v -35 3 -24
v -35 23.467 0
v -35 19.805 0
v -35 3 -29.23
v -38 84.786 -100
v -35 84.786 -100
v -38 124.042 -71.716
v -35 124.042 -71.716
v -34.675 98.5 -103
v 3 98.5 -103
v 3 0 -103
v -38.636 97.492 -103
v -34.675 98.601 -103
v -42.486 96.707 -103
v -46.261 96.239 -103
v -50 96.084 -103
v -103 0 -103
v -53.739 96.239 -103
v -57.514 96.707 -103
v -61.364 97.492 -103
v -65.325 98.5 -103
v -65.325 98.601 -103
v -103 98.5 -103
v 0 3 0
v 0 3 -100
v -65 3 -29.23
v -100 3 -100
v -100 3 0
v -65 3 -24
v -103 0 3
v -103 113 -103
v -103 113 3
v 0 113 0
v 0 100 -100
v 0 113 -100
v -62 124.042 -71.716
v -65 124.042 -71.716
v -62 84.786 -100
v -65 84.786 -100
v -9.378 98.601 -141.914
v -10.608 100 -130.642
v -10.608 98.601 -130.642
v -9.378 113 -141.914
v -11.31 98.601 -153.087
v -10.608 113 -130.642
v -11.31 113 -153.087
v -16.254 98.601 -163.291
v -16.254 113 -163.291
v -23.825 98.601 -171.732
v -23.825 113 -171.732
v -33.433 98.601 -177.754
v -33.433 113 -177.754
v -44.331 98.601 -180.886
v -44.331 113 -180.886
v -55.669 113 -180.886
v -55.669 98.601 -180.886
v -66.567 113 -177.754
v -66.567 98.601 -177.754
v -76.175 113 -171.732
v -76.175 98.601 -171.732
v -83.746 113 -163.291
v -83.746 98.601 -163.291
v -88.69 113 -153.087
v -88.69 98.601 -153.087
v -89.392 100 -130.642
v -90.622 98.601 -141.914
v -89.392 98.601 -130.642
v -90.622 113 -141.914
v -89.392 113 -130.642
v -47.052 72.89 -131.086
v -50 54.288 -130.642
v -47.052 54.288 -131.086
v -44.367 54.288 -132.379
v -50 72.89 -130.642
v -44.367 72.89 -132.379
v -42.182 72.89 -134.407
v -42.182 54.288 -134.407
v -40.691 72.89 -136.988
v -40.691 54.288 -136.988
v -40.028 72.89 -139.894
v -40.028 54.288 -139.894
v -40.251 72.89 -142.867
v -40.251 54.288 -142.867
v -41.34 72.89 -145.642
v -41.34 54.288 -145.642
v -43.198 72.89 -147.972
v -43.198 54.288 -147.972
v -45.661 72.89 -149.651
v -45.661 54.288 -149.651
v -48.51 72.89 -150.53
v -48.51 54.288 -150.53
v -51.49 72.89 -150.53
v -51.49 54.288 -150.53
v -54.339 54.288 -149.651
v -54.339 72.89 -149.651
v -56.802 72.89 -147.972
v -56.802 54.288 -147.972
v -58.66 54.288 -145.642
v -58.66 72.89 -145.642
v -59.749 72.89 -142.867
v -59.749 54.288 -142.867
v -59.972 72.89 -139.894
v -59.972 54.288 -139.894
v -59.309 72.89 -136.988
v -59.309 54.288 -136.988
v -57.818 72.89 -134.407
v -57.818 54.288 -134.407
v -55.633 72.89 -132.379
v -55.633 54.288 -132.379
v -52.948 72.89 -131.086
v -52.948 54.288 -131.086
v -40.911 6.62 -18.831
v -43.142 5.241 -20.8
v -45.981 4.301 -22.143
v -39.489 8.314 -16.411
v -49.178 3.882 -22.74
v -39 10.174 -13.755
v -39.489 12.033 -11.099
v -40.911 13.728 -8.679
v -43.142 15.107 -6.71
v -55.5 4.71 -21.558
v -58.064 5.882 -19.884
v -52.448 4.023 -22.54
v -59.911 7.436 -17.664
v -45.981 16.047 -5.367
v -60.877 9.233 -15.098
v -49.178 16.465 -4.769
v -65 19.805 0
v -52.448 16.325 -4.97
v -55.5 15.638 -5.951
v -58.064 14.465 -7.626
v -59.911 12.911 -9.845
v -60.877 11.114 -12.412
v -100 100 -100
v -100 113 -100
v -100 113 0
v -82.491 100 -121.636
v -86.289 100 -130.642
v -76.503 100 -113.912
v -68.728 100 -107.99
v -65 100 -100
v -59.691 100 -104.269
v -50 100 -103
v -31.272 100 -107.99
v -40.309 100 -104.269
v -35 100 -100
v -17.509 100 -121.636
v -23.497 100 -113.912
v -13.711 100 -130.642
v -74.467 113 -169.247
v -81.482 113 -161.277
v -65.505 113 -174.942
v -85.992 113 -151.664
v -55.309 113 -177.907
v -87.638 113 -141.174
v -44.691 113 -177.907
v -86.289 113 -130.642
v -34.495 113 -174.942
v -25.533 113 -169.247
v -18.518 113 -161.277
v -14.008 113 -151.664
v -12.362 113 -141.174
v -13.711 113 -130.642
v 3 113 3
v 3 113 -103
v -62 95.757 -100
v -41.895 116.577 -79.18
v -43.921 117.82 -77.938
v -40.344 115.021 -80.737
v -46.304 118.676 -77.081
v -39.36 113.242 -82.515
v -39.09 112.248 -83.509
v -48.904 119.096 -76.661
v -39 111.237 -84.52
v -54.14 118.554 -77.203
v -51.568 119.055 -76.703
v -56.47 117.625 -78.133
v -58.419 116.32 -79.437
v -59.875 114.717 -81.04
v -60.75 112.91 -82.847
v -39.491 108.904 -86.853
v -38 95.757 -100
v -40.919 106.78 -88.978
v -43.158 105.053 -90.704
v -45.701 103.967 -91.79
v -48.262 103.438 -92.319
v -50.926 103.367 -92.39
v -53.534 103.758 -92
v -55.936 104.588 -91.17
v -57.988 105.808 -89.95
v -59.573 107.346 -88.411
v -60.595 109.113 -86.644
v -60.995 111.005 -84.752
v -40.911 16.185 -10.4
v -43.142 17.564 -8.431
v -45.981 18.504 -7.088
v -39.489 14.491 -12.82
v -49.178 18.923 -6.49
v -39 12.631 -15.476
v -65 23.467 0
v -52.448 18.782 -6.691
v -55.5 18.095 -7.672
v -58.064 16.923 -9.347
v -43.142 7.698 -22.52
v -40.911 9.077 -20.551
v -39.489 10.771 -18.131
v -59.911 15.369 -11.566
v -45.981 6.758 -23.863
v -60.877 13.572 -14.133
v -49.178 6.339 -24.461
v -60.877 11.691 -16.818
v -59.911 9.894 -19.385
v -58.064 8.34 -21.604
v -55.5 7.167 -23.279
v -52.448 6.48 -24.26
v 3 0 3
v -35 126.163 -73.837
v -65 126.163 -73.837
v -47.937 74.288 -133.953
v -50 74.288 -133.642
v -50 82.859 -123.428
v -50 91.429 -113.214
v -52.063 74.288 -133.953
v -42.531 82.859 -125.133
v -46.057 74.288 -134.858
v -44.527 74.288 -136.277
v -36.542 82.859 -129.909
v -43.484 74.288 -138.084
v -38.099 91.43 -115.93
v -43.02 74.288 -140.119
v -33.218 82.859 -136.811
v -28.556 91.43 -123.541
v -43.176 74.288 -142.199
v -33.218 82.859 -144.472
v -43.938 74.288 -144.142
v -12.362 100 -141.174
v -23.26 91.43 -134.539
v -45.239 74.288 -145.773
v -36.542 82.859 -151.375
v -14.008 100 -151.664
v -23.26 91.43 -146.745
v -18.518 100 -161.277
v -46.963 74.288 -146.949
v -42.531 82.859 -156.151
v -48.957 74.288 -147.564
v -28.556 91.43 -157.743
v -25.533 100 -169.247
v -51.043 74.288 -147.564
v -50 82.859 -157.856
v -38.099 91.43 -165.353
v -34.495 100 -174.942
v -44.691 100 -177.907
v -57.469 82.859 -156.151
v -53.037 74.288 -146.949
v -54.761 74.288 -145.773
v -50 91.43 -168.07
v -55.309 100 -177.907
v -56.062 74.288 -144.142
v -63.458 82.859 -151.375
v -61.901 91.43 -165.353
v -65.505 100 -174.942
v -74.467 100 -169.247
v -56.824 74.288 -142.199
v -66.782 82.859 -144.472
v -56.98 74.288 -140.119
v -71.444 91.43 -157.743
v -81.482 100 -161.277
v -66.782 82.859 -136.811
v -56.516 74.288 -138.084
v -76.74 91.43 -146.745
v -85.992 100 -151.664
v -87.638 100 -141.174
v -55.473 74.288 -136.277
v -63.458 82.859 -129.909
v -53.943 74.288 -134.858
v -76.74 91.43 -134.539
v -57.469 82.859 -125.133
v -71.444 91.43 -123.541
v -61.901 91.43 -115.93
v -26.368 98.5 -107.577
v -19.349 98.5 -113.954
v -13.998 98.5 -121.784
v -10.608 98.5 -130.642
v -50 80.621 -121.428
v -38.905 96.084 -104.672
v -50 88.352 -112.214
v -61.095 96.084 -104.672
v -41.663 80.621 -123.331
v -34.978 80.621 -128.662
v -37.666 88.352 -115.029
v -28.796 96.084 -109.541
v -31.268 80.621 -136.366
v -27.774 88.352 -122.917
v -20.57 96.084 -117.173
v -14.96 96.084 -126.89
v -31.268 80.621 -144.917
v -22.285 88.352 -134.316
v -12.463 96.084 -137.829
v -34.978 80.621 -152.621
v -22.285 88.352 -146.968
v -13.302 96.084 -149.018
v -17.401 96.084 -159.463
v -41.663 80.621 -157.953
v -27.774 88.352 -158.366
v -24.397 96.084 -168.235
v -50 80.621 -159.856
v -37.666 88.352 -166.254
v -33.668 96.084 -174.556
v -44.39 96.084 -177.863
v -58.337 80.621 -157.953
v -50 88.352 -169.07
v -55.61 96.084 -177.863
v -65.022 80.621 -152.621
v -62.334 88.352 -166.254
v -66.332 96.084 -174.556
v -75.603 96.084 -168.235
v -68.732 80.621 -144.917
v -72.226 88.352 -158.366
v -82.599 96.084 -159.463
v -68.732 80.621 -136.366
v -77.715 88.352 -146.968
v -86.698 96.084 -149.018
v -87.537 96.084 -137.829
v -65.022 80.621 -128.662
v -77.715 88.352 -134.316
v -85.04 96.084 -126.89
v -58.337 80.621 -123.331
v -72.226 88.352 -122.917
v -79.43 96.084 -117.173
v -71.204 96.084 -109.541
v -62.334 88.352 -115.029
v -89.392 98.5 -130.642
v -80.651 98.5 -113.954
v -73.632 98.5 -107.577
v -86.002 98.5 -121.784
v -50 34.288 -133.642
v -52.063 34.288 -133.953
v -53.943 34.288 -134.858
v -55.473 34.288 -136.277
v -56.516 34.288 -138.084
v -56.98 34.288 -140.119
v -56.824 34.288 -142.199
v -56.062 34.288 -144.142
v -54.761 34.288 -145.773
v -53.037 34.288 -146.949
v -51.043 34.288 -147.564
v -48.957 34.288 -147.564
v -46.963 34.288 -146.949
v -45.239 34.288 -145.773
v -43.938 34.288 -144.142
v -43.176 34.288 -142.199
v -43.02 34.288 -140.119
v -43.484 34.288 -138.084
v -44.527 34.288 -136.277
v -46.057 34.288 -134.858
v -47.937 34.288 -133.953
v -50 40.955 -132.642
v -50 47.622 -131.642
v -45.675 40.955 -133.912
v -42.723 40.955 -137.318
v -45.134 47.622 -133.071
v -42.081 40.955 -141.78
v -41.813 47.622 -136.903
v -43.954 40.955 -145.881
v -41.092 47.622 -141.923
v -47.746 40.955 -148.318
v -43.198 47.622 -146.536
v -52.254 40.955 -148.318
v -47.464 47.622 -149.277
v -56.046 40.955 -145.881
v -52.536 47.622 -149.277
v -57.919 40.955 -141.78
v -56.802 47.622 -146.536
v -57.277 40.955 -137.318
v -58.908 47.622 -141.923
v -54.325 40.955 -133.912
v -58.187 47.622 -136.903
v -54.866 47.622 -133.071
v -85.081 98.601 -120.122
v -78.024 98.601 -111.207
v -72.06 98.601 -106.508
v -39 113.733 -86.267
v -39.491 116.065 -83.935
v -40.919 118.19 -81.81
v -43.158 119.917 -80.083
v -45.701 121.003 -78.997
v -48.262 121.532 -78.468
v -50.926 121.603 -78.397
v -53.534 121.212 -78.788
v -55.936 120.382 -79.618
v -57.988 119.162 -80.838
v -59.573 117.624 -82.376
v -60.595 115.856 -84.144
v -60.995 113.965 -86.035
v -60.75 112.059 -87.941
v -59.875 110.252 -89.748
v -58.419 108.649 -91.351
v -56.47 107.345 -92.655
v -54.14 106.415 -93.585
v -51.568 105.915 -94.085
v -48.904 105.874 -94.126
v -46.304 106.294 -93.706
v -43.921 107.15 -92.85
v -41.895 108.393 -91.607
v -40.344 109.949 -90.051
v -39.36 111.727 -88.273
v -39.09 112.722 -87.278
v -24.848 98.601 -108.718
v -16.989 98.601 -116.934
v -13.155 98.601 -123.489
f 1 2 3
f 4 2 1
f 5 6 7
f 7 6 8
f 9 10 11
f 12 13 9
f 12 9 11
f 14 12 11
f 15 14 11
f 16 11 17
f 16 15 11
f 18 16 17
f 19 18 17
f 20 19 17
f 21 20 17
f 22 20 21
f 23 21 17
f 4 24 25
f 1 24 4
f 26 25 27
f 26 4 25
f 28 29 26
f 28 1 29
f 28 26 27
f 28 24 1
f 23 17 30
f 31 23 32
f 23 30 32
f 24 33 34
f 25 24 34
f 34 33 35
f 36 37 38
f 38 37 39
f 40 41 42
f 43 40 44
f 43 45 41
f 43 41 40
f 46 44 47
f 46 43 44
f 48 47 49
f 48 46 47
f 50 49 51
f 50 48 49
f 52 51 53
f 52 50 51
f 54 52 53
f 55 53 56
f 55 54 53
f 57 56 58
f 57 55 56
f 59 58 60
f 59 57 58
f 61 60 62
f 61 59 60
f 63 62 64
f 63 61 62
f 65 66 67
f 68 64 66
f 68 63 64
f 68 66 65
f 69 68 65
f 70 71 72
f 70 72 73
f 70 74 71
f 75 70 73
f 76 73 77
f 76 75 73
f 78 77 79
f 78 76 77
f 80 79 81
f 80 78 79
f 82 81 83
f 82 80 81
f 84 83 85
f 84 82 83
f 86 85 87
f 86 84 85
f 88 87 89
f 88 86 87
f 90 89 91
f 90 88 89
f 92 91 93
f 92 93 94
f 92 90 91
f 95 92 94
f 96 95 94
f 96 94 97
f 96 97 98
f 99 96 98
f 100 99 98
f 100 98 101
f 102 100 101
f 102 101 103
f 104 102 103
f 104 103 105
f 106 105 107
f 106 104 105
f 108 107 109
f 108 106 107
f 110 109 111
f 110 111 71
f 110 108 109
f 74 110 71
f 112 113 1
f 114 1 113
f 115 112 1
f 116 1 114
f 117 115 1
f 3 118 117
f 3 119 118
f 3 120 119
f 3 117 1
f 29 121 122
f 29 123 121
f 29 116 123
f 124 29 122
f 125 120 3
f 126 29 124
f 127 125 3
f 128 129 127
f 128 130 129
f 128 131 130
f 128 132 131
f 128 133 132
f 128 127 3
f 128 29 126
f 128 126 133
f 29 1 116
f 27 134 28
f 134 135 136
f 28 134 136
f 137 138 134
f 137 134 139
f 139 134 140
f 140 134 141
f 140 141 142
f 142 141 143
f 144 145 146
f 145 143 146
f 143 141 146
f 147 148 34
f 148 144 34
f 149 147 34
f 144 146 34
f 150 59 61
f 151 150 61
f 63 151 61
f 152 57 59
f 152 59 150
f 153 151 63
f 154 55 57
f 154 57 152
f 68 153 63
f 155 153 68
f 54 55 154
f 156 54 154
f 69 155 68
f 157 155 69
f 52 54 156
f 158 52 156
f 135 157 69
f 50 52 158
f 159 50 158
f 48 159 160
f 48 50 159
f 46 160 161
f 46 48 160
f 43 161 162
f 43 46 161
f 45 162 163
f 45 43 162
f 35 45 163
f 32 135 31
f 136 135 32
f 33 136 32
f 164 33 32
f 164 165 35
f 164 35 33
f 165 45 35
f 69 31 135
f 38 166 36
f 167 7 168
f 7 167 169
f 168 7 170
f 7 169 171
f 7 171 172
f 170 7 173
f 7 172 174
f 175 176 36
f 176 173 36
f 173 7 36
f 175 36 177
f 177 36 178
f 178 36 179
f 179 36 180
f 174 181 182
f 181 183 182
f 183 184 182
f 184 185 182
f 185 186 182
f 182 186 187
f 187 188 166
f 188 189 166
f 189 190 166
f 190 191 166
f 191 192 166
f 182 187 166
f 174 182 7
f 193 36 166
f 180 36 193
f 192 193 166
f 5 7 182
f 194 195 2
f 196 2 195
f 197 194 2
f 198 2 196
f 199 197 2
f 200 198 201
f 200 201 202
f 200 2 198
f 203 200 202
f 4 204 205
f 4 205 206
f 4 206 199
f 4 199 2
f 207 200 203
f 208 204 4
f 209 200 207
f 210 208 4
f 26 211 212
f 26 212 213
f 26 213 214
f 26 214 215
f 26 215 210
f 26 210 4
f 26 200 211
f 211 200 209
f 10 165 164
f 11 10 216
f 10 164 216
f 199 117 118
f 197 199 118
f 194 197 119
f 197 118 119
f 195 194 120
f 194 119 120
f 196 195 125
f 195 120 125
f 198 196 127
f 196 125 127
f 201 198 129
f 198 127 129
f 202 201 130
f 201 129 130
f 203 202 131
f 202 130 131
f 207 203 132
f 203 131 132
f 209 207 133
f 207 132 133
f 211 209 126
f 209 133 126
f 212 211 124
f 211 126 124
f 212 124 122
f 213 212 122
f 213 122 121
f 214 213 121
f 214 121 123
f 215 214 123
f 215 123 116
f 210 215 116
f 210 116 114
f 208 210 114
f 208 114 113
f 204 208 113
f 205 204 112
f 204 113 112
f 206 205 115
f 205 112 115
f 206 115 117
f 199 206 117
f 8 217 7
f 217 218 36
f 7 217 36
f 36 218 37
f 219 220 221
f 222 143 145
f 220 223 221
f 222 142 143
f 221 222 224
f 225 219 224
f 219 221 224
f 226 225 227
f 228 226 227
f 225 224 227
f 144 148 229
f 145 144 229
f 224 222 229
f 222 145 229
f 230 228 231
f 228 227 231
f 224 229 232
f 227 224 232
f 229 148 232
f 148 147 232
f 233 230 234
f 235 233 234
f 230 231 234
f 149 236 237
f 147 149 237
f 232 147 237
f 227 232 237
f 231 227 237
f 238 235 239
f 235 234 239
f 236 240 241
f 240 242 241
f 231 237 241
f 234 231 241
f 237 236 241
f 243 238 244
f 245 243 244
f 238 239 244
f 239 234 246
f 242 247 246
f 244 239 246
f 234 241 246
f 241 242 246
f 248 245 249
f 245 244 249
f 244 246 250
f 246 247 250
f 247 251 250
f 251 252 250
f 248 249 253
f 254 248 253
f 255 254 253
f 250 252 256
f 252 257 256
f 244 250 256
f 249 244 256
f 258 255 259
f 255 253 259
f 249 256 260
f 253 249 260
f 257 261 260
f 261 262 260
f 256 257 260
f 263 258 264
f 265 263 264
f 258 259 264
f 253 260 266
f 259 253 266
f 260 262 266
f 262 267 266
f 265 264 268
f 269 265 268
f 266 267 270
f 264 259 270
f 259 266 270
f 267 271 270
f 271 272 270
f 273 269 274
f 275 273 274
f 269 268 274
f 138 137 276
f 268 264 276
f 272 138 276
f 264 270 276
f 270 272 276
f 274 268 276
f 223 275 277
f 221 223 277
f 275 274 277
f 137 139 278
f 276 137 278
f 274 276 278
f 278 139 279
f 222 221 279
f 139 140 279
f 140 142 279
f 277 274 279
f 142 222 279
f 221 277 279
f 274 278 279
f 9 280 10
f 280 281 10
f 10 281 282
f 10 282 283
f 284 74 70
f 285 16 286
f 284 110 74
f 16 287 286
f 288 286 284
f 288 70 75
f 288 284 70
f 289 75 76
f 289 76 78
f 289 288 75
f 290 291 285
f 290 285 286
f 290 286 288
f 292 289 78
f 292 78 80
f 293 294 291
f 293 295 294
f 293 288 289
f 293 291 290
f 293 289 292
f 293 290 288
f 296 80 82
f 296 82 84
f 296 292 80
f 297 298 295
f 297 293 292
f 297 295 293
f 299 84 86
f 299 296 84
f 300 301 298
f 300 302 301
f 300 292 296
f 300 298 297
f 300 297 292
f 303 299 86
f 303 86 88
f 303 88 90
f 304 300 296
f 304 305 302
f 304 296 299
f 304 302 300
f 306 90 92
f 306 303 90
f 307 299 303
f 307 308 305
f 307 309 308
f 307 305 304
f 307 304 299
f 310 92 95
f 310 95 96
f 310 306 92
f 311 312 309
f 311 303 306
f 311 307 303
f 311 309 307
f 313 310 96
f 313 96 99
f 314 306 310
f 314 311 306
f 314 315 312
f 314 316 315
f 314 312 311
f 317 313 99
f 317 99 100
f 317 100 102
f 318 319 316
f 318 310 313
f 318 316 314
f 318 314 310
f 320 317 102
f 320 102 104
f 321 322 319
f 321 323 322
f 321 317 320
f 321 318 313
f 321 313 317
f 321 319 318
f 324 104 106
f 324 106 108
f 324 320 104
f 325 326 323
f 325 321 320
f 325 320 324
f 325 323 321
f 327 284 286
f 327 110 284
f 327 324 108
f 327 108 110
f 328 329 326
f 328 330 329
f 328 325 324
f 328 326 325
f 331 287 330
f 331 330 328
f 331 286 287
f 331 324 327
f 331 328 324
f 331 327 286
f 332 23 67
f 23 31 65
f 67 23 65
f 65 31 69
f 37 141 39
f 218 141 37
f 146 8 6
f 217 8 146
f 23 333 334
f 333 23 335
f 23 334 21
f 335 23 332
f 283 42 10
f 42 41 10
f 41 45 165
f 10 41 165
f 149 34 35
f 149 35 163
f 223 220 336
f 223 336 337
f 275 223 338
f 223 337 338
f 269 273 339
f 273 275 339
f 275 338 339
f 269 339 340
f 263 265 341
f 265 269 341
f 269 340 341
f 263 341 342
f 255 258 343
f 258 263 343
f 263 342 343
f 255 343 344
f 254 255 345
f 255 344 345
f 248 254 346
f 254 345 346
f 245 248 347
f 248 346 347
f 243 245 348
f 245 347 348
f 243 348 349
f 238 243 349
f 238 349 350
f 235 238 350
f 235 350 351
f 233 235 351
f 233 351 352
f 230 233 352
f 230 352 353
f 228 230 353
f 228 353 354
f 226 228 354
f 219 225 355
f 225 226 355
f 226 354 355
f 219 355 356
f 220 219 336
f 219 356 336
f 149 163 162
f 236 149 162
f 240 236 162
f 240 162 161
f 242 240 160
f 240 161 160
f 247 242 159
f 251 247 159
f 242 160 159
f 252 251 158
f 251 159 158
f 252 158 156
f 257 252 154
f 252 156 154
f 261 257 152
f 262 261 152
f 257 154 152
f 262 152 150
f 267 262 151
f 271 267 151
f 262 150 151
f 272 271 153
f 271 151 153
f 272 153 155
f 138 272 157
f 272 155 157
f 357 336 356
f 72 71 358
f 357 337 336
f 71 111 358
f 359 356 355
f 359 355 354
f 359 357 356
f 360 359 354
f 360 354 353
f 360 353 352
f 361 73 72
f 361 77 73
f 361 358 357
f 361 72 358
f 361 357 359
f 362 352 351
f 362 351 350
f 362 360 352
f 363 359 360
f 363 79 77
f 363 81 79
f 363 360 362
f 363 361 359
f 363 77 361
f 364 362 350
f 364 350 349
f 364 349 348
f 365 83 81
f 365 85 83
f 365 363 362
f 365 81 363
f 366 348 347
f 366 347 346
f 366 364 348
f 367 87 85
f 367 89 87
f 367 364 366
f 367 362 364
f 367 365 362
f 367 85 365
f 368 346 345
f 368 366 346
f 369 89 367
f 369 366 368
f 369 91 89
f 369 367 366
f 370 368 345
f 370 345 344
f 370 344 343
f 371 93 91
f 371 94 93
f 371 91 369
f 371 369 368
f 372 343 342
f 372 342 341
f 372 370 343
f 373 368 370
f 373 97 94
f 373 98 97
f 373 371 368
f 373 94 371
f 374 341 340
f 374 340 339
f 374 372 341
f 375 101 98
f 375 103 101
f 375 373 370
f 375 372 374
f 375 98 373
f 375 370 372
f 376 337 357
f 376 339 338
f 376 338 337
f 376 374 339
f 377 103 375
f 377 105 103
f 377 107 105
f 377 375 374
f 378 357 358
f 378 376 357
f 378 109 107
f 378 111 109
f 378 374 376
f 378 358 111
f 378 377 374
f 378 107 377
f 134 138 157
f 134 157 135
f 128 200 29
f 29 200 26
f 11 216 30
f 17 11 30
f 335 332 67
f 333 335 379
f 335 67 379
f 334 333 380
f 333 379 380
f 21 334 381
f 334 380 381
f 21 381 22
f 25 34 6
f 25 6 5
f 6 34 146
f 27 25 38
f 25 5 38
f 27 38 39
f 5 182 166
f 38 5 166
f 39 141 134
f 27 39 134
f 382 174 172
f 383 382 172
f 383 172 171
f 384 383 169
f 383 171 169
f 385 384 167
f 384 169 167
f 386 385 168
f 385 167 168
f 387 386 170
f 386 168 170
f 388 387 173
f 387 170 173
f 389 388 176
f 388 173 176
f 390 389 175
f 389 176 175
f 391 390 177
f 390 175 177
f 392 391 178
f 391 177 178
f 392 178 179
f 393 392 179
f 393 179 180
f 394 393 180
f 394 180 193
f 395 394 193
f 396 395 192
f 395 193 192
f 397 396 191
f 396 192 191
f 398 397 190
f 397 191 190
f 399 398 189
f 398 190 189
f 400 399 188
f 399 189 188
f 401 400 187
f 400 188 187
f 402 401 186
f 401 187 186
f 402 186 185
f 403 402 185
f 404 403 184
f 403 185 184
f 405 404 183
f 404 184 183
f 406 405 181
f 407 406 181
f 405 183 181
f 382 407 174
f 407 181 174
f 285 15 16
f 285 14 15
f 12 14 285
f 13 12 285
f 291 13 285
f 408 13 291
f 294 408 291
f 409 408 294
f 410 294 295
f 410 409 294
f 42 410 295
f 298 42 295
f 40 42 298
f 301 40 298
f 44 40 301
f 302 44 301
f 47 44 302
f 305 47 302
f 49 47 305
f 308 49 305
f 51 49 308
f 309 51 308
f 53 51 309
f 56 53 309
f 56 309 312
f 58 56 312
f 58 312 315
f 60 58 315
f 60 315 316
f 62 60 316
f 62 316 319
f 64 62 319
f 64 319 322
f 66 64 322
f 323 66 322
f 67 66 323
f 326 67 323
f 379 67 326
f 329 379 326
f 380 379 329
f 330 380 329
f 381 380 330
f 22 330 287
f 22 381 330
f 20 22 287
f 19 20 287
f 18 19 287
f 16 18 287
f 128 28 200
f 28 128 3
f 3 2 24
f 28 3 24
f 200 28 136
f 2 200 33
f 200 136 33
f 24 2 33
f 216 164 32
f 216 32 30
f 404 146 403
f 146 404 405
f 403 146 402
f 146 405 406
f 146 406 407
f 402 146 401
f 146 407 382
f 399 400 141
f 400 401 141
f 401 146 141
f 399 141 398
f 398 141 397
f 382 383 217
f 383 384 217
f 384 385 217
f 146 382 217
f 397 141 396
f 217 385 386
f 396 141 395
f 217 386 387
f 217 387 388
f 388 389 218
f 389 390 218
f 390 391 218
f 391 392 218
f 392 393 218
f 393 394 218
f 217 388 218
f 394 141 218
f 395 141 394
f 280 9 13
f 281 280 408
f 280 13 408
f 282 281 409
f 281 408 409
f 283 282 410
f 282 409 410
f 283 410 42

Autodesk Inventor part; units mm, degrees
ref_plane "YZ Plane" through (0, 0, 0) normal (1, 0, 0) x (0, 1, 0)
ref_plane "XZ Plane" through (0, 0, 0) normal (0, 1, 0) x (-1, 0, 0)
ref_plane "XY Plane" through (0, 0, 0) normal (0, 0, 1) x (1, 0, 0)
sketch "Sketch2" plane through (0, 0, 0) normal (0, 1, 0) x (-1, 0, 0)
  line L0 (0, 0) -> (100, 0)
  line L1 (100, 0) -> (100, -100)
  line L2 (100, -100) -> (0, -100)
  line L3 (0, -100) -> (0, 0)
  dimension "d2" = 100
  dimension "d3" = 100
extrude "Extrusion2" add sketch "Sketch2" along normal blind 3
sketch "Sketch3" plane through (0, 0, 0) normal (1, 0, 0) x (0, 0, -1)
  line L0 (0, 0) -> (100, 0)
  line L1 (100, 0) -> (100, 113)
  line L2 (100, 113) -> (0, 113)
  line L3 (0, 113) -> (0, 0)
  dimension "d6" = 100
  dimension "d7" = 113
extrude "Extrusion3" add sketch "Sketch3" along normal blind 3
sketch "Sketch4" plane through (0, 3, 0) normal (0, 0, 1) x (1, 0, 0)
  line L0 (3, -3) -> (-100, -3) projected
  line L1 (3, -3) -> (-100, -3)
  line L2 (-100, -3) -> (-100, 110)
  line L3 (-100, 110) -> (3, 110)
  line L4 (3, 110) -> (3, -3)
  point P0 (0, -3)
  dimension "d10" = 113
  dimension "d11" = 103
extrude "Extrusion4" add sketch "Sketch4" along normal blind 3
sketch "Sketch5" plane through (-100, 3, 0) normal (-1, 0, 0) x (0, 0, 1)
  line L0 (-100, -3) -> (3, -3) projected
  line L1 (-100, 110) -> (3, 110) projected
  line L2 (3, -3) -> (-100, -3)
  line L3 (-100, -3) -> (-100, 110)
  line L4 (-100, 110) -> (3, 110)
  line L5 (3, 110) -> (3, -3)
  point P0 (0, -3)
  point P1 (3, 110)
extrude "Extrusion5" add sketch "Sketch5" along normal blind 3
sketch "Sketch6" plane through (0, 3, -100) normal (0, 0, -1) x (-1, 0, 0)
  line L0 (103, -3) -> (103, 110) projected
  line L1 (-3, -3) -> (103, -3)
  line L2 (103, -3) -> (103, 97)
  line L3 (103, 97) -> (-3, 97)
  line L4 (-3, 97) -> (-3, -3)
  point P0 (0, -3)
  dimension "d16" = 100
extrude "Extrusion6" add sketch "Sketch6" along normal blind 3
sketch "Sketch7" plane through (3, 0, 0) normal (1, 0, 0) x (0, 0, -1)
  point P0 (0, 0)
ref_plane "Work Plane1" through (-50, 3, 0) normal (1, 0, 0) x (0, 0, -1)
sketch "Sketch8" plane through (-50, 3, 0) normal (1, 0, 0) x (0, 0, -1)
  line L0 (103, 97) -> (103, -3) projected
  line L1 (103, 97) -> (133.6418, 71.2885)
  line L2 (133.6418, 71.2885) -> (133.6418, 31.2885)
  line L3 (130.6418, 69.8896) -> (103, 93.0838)
  line L4 (133.6418, 31.2885) -> (130.6418, 51.2885)
  line L5 (130.6418, 51.2885) -> (130.6418, 69.8896)
  line L6 (103, 93.0838) -> (100, 95.6011)
  line L7 (100, 0) -> (100, 97) projected
  line L8 (100, 97) -> (103, 97) projected
  line L9 (103, 97) -> (103, 110)
  line L10 (100, 110) -> (100, 97) projected
  line L11 (103, 110) -> (100, 110)
  line L12 (100, 110) -> (100, 95.6011)
  line L13 (100, 95.6011) -> (100, 97)
  line L14 (140.6418, 31.2885) -> (140.6418, 72.7039) construction
  point P0 (0, -3)
  dimension "d20" = 40
  dimension "d21" = 50
  dimension "d22" = 40
  dimension "d24" = 3
  dimension "d27" = 20
  dimension "d28" = 18.6011
  dimension "d29" = 7
revolve "Revolution1" add sketch "Sketch8" angle 360 about axis through (-50, 34.2885, -140.6418) along (0, 1, 0)
ref_plane "Work Plane2" through (-50, 63.589, -130.6418) normal (0, 0, -1) x (-1, 0, 0)
sketch "Sketch9" plane through (-50, 63.589, -130.6418) normal (0, 0, -1) x (-1, 0, 0)
  line L0 (-15.3248, 36.411) -> (-53, 36.411) projected
  line L1 (-50, 49.411) -> (50, 49.411) projected
  line L2 (-40.4865, 36.411) -> (40.6129, 36.411)
  line L3 (40.6129, 36.411) -> (40.6129, 49.411)
  line L4 (40.6129, 49.411) -> (-40.4865, 49.411)
  line L5 (-40.4865, 49.411) -> (-40.4865, 36.411)
  point P0 (-50, -63.589)
extrude "Extrusion7" cut sketch "Sketch9" against normal up to surface (130.6418 mm away)
sketch "Sketch10" plane through (-100, 100, -100) normal (0, 1, 0) x (1, 0, 0)
  line L0 (89.3923, 30.6418) -> (86.2892, 30.6418) projected
  line L1 (103, 0) -> (103, 3) projected
  line L2 (89.3923, 30.6418) -> (103, 3)
  line L3 (-3, 3) -> (34.6752, 3) projected
  line L4 (103, 3) -> (-3, 3)
  line L5 (-3, 3) -> (10.6077, 30.6418)
  arc A0 (65.3248, 3) -> (34.6752, 3) centre (50, 40.6418) ccw projected
  point P0 (100, -100)
extrude "Extrusion8" add sketch "Sketch10" against normal blind 1.5 contours L2 L4 A0 | A0 L3 L5
sketch "Sketch11" plane through (-103, 100, -100) normal (0, 1, 0) x (1, 0, 0)
  line L0 (92.3923, 30.6418) -> (89.2892, 30.6418) projected
  line L1 (103, 0) -> (89.2892, 30.6418)
  arc A0 (68.3248, 3) -> (92.3923, 30.6418) centre (53, 40.6418) ccw projected
  line L2 (89.2892, 30.6418) -> (92.3923, 30.6418)
  line L3 (106, 3) -> (92.3923, 30.6418) projected
  line L4 (92.3923, 30.6418) -> (106, 3)
  line L5 (106, 0) -> (103, 0) projected
  line L6 (106, 3) -> (106, 0)
  line L7 (106, 0) -> (103, 0)
  line L8 (16.7108, 30.6418) -> (13.6077, 30.6418) projected
  line L9 (3, -100) -> (3, 0) projected
  line L10 (16.7108, 30.6418) -> (3, 0)
  line L11 (3, 0) -> (0, 0)
  line L12 (0, 0) -> (0, 3) projected
  line L13 (0, 0) -> (0, 3)
  line L14 (13.6077, 30.6418) -> (16.7108, 30.6418)
  line L15 (16.7108, 30.6418) -> (13.6077, 30.6418)
  line L16 (13.6077, 30.6418) -> (0, 3)
  point P0 (103, -100)
  dimension "d35" = 30.8097
extrude "Extrusion9" add sketch "Sketch11" along normal blind 13
ref_plane "Work Plane3" through (0, 3, -13) normal (0, 0, -1) x (-1, 0, 0)
sketch "Sketch13" plane through (-50, 3, 0) normal (1, 0, 0) x (0, 0, -1)
  line L0 (100, 0) -> (0, 0) projected
  line L1 (24, 0) -> (-2.4904, 18.5488)
  line L2 (-2.4904, 18.5488) -> (-0.7697, 21.0062)
  line L3 (-0.7697, 21.0062) -> (29.2303, 0)
  line L4 (12.4755, 11.7318) -> (125.6722, 173.3935)
  point P0 (0, -3)
  dimension "d39" = 35
  dimension "d41" = 3
  dimension "d42" = 30
  dimension "d44" = 24
  dimension "d54" = 90
extrude "Extrusion10" add sketch "Sketch13" along normal mid plane 30
sketch "Sketch21" plane through (-50, 3, 0) normal (1, 0, 0) x (0, 0, -1)
  line L0 (100, 97) -> (73.837, 123.163)
  line L1 (100, 97) -> (100, 0) projected
  line L2 (73.837, 123.163) -> (71.7157, 121.0416)
  line L3 (71.7157, 121.0416) -> (100, 92.7574)
  point P0 (0, -3)
  dimension "d55" = 45
  dimension "d56" = 3
  dimension "d57" = 40
  dimension "d59" = 90
extrude "Extrusion12" add sketch "Sketch21" along normal mid plane 30
ref_plane "Work Plane4" through (-65, 21.0098, 1.7207) normal (0, 0.8192, -0.5736) x (1, 0, 0)
sketch "Sketch24" plane through (-65, 21.0098, 1.7207) normal (0, 0.8192, -0.5736) x (1, 0, 0)
  line L0 (0, 35.6837) -> (30, 35.6837) construction
  line L1 (15, 35.6837) -> (15, 2.1006) construction
  line L2 (0, 2.1006) -> (30, 2.1006) construction
  circle A0 centre (15, 18.8921) radius 11
  point P0 (65, 13.4603)
  dimension "d63" = 22
extrude "Extrusion13" cut sketch "Sketch24" along normal through all
sketch "Sketch25" plane through (-65, 3, 0) normal (-1, 0, 0) x (0, 0, 1)
  line L0 (-71.7157, 121.0416) -> (-73.837, 123.163) projected
  line L1 (-71.7157, 121.0416) -> (-100.9447, 80.4748)
  line L2 (-100, 92.7574) -> (-71.7157, 121.0416) projected
  line L3 (-100.9447, 80.4748) -> (-100, 97)
  line L4 (-73.837, 123.163) -> (-100, 97) projected
  line L5 (-73.837, 123.163) -> (-71.7157, 121.0416)
  point P0 (0, -3)
  dimension "d66" = 50
  dimension "d67" = 170.773
extrude "Extrusion14" add sketch "Sketch25" against normal blind 3
sketch "Sketch26" plane through (-35, 3, 0) normal (1, 0, 0) x (0, 0, -1)
  line L0 (71.7157, 121.0416) -> (100, 92.7574) projected
  line L1 (100, 81.786) -> (71.7157, 121.0416) projected
  line L2 (71.7157, 121.0416) -> (100, 81.786)
  line L3 (100, 81.786) -> (100, 92.7574)
  line L4 (71.7157, 121.0416) -> (73.837, 123.163) projected
  line L5 (100, 92.7574) -> (71.7157, 121.0416)
  point P0 (0, -3)
extrude "Extrusion15" add sketch "Sketch26" against normal blind 3
equation "\"d3\" = d2"
equation "\"d16\" = d2"
properties part number "resoar"
